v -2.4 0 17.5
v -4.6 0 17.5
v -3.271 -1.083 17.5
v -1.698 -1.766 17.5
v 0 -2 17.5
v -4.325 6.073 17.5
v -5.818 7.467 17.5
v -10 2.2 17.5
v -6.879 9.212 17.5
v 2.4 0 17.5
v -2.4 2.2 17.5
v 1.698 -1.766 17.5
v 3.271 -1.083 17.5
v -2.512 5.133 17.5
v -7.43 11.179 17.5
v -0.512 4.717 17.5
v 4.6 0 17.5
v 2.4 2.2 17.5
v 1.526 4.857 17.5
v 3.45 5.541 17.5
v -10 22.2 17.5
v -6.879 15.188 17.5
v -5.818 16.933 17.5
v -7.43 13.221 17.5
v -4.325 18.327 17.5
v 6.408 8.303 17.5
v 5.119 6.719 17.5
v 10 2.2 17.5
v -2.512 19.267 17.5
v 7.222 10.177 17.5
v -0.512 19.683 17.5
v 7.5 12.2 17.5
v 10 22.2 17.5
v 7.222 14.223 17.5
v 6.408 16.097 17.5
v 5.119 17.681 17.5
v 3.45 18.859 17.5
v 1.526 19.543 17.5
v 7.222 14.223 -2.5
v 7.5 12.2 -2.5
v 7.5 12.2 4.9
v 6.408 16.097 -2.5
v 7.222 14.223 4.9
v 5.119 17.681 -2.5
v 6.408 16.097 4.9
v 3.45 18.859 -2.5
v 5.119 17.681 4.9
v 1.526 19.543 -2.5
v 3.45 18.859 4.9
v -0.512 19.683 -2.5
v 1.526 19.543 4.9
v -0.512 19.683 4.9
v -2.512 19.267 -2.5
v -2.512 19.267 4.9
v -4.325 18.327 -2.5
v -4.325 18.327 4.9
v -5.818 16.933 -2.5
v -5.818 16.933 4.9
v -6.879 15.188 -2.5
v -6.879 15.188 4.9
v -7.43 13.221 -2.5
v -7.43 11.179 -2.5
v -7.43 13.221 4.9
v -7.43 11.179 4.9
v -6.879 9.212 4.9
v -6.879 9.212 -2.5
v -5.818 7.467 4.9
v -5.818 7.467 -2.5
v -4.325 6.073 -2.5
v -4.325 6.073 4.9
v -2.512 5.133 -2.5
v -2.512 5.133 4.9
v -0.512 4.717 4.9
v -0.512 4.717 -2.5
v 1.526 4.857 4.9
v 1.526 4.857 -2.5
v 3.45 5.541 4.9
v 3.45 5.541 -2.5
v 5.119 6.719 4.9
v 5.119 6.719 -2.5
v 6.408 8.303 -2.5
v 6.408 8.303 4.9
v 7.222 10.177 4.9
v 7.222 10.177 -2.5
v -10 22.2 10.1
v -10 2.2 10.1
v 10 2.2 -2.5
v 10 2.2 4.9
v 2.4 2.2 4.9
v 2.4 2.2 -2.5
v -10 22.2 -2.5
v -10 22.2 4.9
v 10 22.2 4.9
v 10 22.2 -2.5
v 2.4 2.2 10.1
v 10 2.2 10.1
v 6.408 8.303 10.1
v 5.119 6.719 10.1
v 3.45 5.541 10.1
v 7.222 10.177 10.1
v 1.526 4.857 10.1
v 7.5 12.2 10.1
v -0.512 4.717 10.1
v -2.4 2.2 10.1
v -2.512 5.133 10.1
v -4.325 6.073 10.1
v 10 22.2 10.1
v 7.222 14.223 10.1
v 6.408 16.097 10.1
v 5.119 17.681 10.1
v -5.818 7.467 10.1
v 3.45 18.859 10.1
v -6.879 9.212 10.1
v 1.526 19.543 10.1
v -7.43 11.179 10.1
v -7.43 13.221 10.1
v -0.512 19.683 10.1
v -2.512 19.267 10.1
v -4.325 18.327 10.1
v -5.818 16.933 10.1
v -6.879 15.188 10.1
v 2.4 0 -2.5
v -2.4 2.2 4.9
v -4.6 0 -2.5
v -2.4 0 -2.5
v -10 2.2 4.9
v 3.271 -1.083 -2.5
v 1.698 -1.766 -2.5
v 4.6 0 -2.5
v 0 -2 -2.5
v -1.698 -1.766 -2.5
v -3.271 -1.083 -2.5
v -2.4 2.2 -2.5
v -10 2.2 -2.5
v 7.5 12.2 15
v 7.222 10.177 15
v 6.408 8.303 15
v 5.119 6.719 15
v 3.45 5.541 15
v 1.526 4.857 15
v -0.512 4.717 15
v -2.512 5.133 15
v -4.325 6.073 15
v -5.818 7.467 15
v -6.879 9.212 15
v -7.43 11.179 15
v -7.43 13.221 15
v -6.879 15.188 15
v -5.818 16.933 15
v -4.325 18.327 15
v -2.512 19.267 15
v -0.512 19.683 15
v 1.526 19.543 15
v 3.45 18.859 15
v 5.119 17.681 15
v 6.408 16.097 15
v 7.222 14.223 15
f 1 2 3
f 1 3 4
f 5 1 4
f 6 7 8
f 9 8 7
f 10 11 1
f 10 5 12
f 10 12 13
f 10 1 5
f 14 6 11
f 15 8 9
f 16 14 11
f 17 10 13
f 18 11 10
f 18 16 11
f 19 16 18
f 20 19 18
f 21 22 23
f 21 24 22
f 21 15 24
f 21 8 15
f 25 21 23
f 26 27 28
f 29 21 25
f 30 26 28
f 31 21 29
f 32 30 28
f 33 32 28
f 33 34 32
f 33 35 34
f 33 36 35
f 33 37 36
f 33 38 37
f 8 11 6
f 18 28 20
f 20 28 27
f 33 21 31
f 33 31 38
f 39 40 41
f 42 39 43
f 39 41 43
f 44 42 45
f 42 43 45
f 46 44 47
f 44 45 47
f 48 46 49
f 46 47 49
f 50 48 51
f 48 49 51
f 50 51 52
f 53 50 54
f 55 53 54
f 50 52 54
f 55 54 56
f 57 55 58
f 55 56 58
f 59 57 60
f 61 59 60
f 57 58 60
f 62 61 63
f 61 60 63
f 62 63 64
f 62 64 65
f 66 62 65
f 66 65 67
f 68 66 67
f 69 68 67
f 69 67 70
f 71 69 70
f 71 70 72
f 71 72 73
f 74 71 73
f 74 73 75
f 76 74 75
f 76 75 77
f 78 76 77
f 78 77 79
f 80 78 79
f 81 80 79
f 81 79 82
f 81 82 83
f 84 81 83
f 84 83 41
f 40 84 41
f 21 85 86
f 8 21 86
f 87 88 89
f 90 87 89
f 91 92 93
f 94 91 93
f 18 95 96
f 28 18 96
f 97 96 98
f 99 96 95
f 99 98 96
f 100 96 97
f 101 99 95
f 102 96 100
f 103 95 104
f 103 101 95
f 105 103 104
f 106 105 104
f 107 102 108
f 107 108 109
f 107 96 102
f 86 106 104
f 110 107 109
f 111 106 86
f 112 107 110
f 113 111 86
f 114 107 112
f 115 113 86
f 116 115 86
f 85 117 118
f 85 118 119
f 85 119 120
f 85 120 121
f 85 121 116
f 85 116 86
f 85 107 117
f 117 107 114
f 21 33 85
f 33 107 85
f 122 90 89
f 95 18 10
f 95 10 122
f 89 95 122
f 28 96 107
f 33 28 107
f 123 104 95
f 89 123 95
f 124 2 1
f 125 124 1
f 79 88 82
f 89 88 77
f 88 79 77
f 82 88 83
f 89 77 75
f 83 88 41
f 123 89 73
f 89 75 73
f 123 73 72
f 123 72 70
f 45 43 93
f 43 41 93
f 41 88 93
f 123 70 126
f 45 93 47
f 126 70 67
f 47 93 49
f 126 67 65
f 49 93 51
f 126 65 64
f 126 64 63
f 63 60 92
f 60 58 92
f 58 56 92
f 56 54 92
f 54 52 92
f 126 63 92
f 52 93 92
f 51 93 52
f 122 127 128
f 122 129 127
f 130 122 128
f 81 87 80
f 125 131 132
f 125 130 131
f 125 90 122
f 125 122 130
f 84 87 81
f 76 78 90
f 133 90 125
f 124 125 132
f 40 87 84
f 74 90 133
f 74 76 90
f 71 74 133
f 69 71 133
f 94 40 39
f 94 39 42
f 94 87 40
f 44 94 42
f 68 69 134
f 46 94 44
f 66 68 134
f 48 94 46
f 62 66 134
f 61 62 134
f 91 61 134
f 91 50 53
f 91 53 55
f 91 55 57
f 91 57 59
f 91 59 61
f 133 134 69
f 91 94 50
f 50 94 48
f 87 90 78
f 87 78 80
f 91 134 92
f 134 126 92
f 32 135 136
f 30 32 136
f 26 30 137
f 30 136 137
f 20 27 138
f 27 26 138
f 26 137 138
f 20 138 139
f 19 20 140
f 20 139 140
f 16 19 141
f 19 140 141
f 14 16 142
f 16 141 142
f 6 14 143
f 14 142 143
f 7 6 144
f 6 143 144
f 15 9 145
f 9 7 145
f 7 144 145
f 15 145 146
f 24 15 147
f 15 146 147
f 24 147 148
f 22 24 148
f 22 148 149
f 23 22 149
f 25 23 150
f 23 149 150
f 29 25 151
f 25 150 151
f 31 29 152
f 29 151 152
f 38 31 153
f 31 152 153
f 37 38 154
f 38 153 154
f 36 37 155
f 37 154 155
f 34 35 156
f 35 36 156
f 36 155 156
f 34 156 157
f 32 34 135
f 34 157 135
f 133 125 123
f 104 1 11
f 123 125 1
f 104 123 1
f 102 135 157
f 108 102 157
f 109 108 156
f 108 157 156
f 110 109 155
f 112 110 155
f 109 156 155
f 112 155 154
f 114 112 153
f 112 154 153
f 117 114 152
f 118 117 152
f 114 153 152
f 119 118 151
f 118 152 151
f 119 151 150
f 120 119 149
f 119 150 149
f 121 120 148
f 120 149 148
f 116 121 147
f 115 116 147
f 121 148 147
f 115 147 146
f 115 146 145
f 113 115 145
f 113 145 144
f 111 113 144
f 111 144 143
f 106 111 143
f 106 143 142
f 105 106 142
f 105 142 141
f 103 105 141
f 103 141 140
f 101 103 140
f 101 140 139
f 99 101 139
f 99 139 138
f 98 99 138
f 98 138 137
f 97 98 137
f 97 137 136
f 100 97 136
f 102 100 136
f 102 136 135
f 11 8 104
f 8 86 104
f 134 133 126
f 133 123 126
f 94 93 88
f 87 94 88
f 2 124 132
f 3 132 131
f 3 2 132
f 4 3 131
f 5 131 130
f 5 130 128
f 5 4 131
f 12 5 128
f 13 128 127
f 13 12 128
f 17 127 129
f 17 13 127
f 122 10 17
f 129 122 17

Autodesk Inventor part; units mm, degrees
ref_plane "YZ Plane" through (0, 0, 0) normal (1, 0, 0) x (0, 1, 0)
ref_plane "XZ Plane" through (0, 0, 0) normal (0, 1, 0) x (-1, 0, 0)
ref_plane "XY Plane" through (0, 0, 0) normal (0, 0, 1) x (1, 0, 0)
sketch "Skizze2" plane through (0, 0, 0) normal (0, 0, 1) x (1, 0, 0)
  line L0 (2.4, 0) -> (2.4, 7)
  line L1 (-2.4, 0) -> (-2.4, 7)
  line L2 (0, 0) -> (2.4, 0) construction
  line L3 (-2.4, 7) -> (2.4, 7)
  line L4 (-2.4, 0) -> (-4.6, 0)
  line L5 (2.4, 0) -> (4.6, 0)
  arc A0 (-4.6, 0) -> (4.6, 0) centre (0, 4.29) ccw
  point P0 (0, -2)
  dimension "d0" = 7
  dimension "d1" = 4.8
  dimension "d2" = 2.4
  dimension "d3" = 2.2
  dimension "d4" = 2
extrude "Extrusion1" add sketch "Skizze2" along normal blind 15
sketch "Skizze3" plane through (0, 0, 15) normal (0, 0, 1) x (1, 0, 0)
  line L0 (-2.4, 0) -> (-2.4, 2.2) construction
  line L1 (-2.4, 2.2) -> (-10, 2.2)
  line L2 (-2.4, 2.2) -> (10, 2.2)
  line L3 (-10, 2.2) -> (10, 2.2)
  line L4 (10, 2.2) -> (10, 7)
  line L5 (10, 7) -> (-10, 7)
  line L6 (-10, 7) -> (-10, 2.2)
  line L7 (-10, 7) -> (10, 7)
  line L8 (10, 7) -> (10, 22.2)
  line L9 (10, 22.2) -> (-10, 22.2)
  line L10 (-10, 22.2) -> (-10, 7)
  point P0 (0, 0)
  point P1 (2.4, 7)
  dimension "d7" = 2.2
  dimension "d8" = 20
  dimension "d9" = 10
  dimension "d10" = 20
  dimension "d39" = 20
extrude "Extrusion2" add sketch "Skizze3" against normal blind 5
sketch "Skizze15" plane through (0, 0, 15) normal (0, 0, 1) x (1, 0, 0)
  circle A0 centre (0, 12.2) radius 7.5
  line L0 (-10, 22.2) -> (-10, 2.2) projected
  line L1 (10, 22.2) -> (-10, 22.2) projected
  point P0 (0, 0)
  dimension "d40" = 15
  dimension "d41" = 10
  dimension "d42" = 10
extrude "Extrusion12" cut sketch "Skizze15" against normal blind 5
sketch "Skizze16" plane through (0, 0, 0) normal (0, 0, -1) x (-1, 0, 0)
  line L0 (-10, 2.2) -> (-2.4, 2.2) projected
  line L1 (10, 22.2) -> (10, 2.2) projected
  line L2 (-10, 2.2) -> (10, 2.2)
  line L3 (10, 2.2) -> (10, 22.2)
  line L4 (10, 22.2) -> (-10, 22.2)
  line L5 (-10, 22.2) -> (-10, 2.2)
  point P0 (0, 0)
  point P1 (10, 2.2)
extrude "Extrusion13" cut sketch "Skizze16" against normal blind 10
ref_plane "Arbeitsebene3" through (0, 0, 7.5) normal (0, 0, -1) x (-1, 0, 0)
mirror "Spiegeln2" about plane through (0, 0, 7.5) normal (0, 0, -1) of "Extrusion2", "Extrusion12"
sketch "Skizze18" plane through (0, 0, 7.5) normal (0, 0, -1) x (-1, 0, 0)
  line L0 (10, 2.2) -> (10, 22.2) projected
  line L1 (-10, 22.2) -> (-10, 2.2) projected
  line L2 (10, 2.2) -> (-10, 2.2)
  line L3 (-10, 2.2) -> (-10, 22.2)
  line L4 (-10, 22.2) -> (10, 22.2)
  line L5 (10, 22.2) -> (10, 2.2)
  point P0 (0, 0)
  point P1 (-10, 2.2)
extrude "Extrusion14" cut sketch "Skizze18" along normal mid plane 5.2
sketch "Skizze19" plane through (0, 0, 15) normal (0, 0, 1) x (1, 0, 0)
  circle A0 centre (0, 12.2) radius 7.5 projected
  line L0 (-2.4, 2.2) -> (-2.4, 0) projected
  line L1 (-2.4, 0) -> (-4.6, 0) projected
  arc A1 (-4.6, 0) -> (4.6, 0) centre (0, 4.29) ccw projected
  line L2 (4.6, 0) -> (2.4, 0) projected
  line L3 (2.4, 0) -> (2.4, 2.2) projected
  line L4 (2.4, 2.2) -> (10, 2.2) projected
  line L5 (10, 2.2) -> (10, 22.2) projected
  line L6 (10, 22.2) -> (-10, 22.2) projected
  line L7 (-10, 22.2) -> (-10, 2.2) projected
  line L8 (-10, 2.2) -> (-2.4, 2.2) projected
  point P0 (0, 0)
extrude "Extrusion15" add sketch "Skizze19" along normal blind 2.5
mirror "Spiegeln3" about plane through (0, 0, 7.5) normal (0, 0, -1) of "Extrusion15"
ref_plane "Arbeitsebene4" through (0, 0, 7.5) normal (0, 0, -1) x (-1, 0, 0)
properties part number "Connector MiniTec"
